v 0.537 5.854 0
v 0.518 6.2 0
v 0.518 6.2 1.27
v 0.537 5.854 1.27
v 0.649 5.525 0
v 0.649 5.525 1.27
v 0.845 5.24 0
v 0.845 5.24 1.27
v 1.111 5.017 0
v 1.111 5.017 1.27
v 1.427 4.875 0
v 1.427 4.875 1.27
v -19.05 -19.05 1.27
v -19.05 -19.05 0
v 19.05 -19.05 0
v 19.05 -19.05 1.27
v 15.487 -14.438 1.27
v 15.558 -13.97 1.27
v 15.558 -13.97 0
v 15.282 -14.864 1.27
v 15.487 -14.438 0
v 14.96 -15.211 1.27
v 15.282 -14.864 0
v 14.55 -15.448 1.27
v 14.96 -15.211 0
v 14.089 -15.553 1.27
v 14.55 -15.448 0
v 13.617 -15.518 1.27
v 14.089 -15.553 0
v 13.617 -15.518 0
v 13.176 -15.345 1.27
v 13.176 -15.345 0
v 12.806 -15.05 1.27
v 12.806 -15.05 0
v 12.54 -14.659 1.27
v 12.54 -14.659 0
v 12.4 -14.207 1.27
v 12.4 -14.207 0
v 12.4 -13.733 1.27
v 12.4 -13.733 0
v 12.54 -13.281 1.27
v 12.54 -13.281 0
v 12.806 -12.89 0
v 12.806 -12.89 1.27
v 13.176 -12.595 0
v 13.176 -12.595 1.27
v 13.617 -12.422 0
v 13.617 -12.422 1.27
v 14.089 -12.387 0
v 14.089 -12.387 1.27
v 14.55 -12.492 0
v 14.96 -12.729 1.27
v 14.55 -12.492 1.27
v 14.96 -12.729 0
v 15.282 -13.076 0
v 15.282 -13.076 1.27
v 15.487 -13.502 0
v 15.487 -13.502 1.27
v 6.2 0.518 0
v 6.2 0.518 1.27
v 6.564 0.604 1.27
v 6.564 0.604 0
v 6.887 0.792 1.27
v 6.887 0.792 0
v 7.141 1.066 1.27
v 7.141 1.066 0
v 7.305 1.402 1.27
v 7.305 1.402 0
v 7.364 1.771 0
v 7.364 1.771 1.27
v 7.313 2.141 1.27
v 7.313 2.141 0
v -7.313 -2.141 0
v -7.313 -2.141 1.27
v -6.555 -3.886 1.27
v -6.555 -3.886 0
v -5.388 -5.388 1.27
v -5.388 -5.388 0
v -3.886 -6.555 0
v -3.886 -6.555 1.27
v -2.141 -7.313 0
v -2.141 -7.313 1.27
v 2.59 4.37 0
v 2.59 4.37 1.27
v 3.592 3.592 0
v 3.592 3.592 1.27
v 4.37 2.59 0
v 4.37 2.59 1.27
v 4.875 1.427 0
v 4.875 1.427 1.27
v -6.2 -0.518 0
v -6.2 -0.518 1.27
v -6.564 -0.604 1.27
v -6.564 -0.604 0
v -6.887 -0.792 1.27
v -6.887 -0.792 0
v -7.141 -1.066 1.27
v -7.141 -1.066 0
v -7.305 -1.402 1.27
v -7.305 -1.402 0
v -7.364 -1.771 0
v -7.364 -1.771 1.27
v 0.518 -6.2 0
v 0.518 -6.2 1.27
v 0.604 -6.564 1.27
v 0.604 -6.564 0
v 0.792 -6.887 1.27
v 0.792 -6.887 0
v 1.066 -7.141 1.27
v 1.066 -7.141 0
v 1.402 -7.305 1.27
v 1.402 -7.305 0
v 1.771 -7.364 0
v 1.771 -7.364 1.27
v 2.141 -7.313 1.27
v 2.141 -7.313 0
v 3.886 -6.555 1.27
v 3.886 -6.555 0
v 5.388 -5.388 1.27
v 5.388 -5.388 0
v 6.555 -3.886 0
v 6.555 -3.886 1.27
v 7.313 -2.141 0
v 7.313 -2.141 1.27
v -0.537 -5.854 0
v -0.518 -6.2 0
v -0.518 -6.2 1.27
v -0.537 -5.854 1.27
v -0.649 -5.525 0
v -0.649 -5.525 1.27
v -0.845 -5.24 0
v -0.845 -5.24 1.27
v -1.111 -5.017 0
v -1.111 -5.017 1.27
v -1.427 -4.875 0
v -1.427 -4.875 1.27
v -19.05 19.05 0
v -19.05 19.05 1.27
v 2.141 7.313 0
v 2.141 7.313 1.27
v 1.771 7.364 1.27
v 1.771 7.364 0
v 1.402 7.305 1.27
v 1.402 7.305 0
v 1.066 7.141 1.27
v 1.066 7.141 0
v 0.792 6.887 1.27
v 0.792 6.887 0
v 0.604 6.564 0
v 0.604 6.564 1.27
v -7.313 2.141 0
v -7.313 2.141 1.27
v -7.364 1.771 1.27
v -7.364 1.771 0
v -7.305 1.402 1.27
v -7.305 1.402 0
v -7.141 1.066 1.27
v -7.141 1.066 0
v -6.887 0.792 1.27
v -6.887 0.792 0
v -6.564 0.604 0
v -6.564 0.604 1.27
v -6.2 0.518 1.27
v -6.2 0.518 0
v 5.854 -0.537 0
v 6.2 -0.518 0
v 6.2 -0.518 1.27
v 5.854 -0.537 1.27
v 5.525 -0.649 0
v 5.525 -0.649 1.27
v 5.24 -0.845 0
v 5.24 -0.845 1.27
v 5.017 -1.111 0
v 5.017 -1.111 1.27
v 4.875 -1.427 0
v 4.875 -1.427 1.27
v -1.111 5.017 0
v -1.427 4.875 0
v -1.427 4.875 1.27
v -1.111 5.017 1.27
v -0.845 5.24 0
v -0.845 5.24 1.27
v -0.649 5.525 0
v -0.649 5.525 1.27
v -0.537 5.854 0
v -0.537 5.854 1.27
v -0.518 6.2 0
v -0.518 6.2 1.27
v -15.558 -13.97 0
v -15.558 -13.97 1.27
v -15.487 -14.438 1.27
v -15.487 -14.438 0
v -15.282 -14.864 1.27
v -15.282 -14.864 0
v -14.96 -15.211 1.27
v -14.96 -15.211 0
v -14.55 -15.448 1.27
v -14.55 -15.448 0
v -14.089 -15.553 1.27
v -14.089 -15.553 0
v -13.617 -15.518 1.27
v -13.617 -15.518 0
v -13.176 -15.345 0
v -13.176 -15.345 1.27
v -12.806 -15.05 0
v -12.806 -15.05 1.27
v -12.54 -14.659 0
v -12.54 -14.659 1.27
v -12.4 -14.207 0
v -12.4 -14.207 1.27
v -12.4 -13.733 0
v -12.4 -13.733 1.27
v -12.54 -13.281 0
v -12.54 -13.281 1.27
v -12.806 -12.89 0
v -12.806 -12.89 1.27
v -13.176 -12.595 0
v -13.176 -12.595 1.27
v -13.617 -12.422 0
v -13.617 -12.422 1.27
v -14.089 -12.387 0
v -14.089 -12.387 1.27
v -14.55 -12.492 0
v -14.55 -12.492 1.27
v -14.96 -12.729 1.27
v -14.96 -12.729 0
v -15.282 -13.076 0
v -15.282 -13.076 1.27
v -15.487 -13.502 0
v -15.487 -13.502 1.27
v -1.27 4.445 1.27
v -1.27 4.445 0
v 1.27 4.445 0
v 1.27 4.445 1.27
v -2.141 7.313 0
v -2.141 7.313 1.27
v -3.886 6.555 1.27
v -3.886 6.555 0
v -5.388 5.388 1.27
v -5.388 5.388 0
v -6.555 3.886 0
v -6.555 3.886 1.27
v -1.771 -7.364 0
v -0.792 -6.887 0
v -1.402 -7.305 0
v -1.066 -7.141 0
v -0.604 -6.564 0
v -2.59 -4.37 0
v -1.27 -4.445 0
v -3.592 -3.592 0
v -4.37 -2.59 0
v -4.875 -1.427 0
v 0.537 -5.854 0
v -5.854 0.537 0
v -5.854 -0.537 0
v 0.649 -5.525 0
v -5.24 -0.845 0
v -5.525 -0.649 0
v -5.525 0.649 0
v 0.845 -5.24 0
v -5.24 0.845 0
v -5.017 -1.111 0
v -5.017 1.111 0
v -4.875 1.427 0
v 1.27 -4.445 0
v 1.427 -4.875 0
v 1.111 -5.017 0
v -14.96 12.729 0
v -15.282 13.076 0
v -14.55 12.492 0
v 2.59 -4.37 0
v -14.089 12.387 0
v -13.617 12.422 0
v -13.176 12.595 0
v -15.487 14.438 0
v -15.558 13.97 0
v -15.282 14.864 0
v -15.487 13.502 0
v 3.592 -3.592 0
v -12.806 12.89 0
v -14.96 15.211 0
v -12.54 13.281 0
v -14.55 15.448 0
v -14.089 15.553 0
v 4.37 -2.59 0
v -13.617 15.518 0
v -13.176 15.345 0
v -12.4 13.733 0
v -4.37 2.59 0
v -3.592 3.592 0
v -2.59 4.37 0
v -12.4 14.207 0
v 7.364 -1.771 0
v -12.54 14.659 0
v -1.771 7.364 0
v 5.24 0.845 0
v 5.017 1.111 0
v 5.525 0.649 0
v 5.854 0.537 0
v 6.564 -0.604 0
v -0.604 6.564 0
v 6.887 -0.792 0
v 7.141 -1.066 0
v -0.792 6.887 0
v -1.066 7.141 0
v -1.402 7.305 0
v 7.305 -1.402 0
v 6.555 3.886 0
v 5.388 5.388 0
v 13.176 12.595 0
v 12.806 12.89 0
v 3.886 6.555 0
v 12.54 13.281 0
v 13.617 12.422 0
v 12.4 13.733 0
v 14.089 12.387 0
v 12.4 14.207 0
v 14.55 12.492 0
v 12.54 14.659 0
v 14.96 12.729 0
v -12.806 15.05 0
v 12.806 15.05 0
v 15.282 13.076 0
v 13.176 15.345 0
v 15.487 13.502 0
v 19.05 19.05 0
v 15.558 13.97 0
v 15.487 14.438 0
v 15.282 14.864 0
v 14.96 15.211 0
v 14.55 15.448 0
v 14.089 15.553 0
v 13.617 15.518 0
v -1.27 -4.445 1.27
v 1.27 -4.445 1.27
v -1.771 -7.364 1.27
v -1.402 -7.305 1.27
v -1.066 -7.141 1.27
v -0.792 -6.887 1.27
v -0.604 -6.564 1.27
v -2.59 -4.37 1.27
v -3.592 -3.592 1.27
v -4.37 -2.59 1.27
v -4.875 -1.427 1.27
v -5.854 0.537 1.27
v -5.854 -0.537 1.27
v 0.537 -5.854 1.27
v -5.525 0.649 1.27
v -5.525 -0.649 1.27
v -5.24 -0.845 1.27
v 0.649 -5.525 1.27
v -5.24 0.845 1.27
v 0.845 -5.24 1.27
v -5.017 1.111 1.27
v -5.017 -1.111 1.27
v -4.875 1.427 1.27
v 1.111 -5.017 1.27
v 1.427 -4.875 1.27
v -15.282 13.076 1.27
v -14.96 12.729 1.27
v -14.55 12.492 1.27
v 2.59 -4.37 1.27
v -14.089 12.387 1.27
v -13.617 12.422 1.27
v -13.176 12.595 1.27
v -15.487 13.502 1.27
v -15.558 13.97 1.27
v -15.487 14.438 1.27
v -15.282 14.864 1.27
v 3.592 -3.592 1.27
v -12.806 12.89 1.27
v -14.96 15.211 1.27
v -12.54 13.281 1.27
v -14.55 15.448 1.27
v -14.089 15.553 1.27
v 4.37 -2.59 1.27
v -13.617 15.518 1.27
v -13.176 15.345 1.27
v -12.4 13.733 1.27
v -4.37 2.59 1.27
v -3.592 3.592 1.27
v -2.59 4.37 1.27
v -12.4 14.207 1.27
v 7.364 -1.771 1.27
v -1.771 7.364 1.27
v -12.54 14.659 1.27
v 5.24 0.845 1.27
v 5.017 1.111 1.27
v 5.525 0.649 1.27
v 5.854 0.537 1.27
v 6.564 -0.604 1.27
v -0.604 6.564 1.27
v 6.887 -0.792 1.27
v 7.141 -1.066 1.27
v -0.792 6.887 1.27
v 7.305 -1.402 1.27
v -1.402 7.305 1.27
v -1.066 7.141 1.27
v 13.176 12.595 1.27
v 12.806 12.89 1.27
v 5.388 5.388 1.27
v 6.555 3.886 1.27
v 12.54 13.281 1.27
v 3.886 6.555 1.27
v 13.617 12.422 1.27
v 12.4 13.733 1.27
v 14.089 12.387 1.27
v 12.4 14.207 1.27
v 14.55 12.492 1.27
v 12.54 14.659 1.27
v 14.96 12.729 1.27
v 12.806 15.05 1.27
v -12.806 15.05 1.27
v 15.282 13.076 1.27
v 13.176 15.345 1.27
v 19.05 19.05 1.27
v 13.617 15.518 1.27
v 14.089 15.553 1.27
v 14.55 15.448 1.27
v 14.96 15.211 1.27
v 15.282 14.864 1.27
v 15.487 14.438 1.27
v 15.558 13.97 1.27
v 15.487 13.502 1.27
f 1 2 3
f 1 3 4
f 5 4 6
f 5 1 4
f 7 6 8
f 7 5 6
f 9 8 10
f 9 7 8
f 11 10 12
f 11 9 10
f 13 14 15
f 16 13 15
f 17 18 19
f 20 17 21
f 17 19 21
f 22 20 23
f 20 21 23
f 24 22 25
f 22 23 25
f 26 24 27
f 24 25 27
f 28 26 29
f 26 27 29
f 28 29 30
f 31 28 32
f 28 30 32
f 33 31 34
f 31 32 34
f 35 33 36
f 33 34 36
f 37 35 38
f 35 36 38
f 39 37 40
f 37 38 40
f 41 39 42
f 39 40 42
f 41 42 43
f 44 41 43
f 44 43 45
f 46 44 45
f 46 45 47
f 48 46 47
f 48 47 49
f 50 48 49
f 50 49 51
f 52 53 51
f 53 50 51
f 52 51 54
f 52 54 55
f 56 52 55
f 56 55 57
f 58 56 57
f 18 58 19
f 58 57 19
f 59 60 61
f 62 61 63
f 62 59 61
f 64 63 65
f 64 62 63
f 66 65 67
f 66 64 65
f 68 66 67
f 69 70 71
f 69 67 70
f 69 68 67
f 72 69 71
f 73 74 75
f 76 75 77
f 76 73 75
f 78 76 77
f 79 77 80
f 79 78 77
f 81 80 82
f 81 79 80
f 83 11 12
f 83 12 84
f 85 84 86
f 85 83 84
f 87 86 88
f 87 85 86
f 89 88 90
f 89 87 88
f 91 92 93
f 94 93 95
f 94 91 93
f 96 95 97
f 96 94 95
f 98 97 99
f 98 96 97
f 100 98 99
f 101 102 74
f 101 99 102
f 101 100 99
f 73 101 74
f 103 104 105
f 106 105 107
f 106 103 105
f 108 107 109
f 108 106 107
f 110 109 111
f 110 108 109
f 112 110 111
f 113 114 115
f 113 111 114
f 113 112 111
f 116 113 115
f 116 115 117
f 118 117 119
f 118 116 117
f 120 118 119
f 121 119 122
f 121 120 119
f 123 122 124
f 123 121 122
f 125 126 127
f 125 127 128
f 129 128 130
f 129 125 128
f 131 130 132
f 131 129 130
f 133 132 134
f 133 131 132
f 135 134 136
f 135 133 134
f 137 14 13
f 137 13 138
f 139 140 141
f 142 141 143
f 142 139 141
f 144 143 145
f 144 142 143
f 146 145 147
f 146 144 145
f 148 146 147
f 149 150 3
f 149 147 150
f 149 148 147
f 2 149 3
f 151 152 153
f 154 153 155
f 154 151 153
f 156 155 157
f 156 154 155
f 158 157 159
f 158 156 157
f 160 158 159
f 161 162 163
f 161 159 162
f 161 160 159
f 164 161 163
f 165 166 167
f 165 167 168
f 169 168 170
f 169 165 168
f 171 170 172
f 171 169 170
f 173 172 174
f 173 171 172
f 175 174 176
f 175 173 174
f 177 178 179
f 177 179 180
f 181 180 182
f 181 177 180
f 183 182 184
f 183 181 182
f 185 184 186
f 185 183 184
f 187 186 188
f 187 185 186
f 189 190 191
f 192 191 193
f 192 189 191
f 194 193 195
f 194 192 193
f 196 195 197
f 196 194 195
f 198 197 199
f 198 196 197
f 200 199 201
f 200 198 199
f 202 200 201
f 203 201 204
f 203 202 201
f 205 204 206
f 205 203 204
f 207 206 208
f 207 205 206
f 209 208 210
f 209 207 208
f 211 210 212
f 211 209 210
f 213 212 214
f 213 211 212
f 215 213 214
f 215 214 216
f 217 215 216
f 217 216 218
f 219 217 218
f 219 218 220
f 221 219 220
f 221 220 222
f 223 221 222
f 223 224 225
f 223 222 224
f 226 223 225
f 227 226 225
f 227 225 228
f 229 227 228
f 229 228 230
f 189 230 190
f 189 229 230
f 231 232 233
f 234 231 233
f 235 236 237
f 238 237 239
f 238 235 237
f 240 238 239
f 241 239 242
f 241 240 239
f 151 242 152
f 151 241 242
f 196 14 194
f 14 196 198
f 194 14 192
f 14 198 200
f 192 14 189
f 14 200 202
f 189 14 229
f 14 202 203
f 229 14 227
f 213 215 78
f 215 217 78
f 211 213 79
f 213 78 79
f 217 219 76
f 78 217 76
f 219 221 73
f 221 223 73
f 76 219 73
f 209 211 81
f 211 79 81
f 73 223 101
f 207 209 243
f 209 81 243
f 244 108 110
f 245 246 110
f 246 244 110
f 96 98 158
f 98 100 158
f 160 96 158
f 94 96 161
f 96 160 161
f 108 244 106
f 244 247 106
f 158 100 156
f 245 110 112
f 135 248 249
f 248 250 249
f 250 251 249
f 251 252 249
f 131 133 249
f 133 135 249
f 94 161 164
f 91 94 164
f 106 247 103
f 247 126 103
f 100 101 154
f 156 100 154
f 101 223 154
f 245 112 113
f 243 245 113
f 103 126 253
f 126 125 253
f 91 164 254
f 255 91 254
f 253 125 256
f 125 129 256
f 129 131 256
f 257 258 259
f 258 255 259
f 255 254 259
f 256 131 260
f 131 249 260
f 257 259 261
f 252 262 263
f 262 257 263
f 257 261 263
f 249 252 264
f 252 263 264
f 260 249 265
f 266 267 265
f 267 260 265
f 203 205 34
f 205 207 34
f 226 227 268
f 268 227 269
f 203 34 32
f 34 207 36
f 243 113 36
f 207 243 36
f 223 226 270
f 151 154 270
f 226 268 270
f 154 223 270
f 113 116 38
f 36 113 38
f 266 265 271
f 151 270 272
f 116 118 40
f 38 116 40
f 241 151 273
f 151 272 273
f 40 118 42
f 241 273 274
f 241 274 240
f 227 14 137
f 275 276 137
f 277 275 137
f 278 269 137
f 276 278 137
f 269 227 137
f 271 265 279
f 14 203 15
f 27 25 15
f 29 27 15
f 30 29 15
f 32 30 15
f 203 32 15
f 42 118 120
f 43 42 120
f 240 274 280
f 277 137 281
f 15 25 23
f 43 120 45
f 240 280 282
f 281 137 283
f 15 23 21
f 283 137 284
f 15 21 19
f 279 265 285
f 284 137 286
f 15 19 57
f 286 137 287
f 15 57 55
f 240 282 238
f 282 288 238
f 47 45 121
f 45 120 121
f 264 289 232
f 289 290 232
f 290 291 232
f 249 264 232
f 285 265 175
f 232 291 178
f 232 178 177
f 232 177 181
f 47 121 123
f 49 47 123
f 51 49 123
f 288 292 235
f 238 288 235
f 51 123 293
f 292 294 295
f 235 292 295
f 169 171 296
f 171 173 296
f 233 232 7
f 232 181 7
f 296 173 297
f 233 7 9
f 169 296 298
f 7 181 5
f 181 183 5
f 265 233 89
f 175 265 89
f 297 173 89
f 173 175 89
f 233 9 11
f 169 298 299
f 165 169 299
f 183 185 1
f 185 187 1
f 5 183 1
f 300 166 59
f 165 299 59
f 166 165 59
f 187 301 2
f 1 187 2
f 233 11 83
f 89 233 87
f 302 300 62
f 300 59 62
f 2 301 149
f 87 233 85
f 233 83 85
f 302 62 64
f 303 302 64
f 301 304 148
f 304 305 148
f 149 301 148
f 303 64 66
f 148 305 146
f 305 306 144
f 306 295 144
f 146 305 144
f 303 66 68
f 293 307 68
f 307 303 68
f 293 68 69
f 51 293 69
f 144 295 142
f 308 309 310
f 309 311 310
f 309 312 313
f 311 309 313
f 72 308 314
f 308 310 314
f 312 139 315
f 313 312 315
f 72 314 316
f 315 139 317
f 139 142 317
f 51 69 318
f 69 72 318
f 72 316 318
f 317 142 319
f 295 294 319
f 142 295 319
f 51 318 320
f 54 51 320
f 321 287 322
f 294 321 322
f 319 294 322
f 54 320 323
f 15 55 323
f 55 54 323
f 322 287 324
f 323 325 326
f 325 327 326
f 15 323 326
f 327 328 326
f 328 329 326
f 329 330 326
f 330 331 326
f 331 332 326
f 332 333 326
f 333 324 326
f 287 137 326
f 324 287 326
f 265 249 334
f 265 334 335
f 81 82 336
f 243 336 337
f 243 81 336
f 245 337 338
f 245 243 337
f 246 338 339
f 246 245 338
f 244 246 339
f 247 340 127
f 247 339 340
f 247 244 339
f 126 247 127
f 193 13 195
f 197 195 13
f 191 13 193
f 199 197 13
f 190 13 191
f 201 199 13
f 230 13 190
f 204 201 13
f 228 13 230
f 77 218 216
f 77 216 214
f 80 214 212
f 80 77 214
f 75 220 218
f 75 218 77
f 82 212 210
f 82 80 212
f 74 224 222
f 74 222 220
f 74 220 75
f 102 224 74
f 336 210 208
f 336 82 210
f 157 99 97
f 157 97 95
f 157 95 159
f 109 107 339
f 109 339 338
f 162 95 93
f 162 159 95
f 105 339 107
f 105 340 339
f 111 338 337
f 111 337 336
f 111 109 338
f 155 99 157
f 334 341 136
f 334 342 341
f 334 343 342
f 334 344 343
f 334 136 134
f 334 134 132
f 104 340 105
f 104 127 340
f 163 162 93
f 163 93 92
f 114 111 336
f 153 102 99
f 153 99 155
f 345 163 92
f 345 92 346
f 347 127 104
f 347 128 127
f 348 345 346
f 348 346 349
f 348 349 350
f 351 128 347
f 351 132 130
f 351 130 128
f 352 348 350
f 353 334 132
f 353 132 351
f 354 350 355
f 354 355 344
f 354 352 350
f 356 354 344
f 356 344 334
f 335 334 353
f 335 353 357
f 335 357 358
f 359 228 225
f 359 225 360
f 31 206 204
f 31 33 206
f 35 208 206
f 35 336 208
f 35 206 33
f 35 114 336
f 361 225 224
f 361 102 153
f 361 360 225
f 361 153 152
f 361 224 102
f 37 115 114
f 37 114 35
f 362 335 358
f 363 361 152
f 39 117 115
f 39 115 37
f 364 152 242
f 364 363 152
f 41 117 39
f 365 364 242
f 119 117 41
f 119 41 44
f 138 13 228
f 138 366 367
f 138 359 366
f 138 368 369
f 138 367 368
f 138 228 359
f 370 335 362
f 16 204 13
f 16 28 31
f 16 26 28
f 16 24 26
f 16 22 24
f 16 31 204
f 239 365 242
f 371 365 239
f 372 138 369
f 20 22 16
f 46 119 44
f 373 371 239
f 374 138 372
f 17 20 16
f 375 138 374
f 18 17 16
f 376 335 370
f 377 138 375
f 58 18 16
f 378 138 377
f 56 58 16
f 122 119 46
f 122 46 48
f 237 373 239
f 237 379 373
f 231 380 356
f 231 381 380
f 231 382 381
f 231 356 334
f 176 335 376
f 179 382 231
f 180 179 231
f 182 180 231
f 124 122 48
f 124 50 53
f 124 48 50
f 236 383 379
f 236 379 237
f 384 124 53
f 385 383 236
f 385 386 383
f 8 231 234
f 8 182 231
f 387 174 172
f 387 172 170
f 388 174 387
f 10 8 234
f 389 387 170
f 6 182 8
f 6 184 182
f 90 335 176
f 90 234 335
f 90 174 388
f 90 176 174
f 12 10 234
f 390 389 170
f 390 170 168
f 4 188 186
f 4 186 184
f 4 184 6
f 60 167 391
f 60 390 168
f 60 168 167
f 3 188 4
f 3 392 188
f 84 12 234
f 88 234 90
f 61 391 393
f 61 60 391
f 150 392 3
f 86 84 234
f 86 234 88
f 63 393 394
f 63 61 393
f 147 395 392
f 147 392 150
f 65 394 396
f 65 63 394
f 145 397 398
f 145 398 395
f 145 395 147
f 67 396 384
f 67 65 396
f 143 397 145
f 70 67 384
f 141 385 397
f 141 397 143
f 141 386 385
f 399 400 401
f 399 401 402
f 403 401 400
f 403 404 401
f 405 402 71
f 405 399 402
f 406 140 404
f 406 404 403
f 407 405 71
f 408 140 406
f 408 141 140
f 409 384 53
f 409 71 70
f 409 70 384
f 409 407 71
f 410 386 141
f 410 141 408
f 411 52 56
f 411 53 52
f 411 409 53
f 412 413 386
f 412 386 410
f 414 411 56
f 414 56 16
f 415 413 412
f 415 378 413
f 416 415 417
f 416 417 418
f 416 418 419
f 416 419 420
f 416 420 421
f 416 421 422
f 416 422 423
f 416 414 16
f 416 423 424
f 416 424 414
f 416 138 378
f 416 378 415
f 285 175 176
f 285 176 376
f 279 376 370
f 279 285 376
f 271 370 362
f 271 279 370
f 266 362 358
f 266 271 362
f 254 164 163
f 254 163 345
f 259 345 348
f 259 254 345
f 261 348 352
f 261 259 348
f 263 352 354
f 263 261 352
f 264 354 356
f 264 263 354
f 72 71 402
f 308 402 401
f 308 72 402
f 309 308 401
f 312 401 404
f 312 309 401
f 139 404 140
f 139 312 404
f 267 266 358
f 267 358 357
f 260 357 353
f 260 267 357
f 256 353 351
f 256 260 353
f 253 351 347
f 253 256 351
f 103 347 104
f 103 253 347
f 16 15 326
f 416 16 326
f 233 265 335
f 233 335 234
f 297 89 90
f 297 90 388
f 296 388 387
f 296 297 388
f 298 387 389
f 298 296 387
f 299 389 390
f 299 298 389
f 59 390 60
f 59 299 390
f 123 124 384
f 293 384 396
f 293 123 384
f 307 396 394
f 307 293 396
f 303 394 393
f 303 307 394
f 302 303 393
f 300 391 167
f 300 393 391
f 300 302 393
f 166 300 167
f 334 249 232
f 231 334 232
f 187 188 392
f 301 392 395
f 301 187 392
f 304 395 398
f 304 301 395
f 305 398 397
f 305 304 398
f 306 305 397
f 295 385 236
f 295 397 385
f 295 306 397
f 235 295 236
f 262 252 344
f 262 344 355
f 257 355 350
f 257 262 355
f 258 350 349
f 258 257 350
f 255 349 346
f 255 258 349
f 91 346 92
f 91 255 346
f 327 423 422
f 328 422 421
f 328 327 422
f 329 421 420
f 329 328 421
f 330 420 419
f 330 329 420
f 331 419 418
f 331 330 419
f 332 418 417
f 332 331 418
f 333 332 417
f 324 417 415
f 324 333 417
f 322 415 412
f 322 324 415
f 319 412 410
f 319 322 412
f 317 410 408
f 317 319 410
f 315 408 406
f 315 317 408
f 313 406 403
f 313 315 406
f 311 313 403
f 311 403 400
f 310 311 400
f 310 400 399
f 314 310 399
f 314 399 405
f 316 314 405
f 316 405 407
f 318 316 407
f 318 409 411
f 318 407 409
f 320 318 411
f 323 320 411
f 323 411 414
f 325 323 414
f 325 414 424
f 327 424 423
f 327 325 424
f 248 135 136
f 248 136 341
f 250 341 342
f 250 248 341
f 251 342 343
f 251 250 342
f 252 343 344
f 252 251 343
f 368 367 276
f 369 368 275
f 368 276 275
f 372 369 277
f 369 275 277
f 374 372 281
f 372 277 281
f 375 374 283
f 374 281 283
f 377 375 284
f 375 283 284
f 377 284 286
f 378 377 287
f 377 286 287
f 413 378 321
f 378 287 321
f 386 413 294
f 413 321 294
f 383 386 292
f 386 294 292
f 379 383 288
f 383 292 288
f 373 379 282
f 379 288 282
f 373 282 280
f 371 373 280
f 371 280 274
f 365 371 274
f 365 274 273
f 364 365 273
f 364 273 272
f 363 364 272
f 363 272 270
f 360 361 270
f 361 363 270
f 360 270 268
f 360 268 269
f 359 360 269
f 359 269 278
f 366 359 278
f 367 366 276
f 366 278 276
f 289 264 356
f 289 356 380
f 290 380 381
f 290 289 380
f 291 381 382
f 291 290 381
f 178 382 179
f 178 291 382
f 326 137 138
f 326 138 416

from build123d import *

# Parameters (mm, degrees)
F0_W     = 38.1
F0_H     = 38.1
F1_DEPTH = 1.27
F2_R     = 1.5875
F3_DEPTH = 25.4
F6_W     = 2.54
F6_H     = 8.89
F7_DEPTH = 25.4


with BuildPart() as f1:
    # F0 (on Top) → F1 (new body)
    with BuildSketch(Plane.XY):
        Rectangle(F0_W, F0_H)
    extrude(amount=F1_DEPTH)

    # F2 (on Top) → F3 (cut)
    with BuildSketch(Plane.XY):
        with Locations((13.97, 13.97)):
            Circle(F2_R)
    extrude(amount=F3_DEPTH, mode=Mode.SUBTRACT)

    # F4: F1 across plane


with BuildPart() as f1_1:
    add(f1.part)
    add(f1.part.mirror(Plane.YZ), mode=Mode.INTERSECT)

    # F5: F1 across plane


with BuildPart() as f1_2:
    add(f1_1.part)
    add(f1_1.part.mirror(Plane.XZ), mode=Mode.INTERSECT)

    # F6 (on Top) → F7 (cut)
    with BuildSketch(Plane.XY):
        with BuildLine():
            ThreePointArc((-6.200063, -0.518475), (-7.141481, -1.065611), (-7.313076, -2.14087))
            ThreePointArc((-7.313076, -2.14087), (-5.388154, -5.388154), (-2.14087, -7.313076))
            ThreePointArc((-2.14087, -7.313076), (-1.065611, -7.141481), (-0.518475, -6.200063))
            ThreePointArc((-0.518475, -6.200063), (-0.736807, -5.375783), (-1.427246, -4.875384))
            ThreePointArc((-1.427246, -4.875384), (-3.592102, -3.592102), (-4.875384, -1.427246))
            ThreePointArc((-4.875384, -1.427246), (-5.375783, -0.736807), (-6.200063, -0.518475))
        make_face()
        with BuildLine():
            ThreePointArc((0.518475, -6.200063), (1.065611, -7.141481), (2.14087, -7.313076))
            ThreePointArc((2.14087, -7.313076), (5.388154, -5.388154), (7.313076, -2.14087))
            ThreePointArc((7.313076, -2.14087), (7.141481, -1.065611), (6.200063, -0.518475))
            ThreePointArc((6.200063, -0.518475), (5.375783, -0.736807), (4.875384, -1.427246))
            ThreePointArc((4.875384, -1.427246), (3.592102, -3.592102), (1.427246, -4.875384))
            ThreePointArc((1.427246, -4.875384), (0.736807, -5.375783), (0.518475, -6.200063))
        make_face()
        with BuildLine():
            ThreePointArc((6.200063, 0.518475), (7.141481, 1.065611), (7.313076, 2.14087))
            ThreePointArc((7.313076, 2.14087), (5.388154, 5.388154), (2.14087, 7.313076))
            ThreePointArc((2.14087, 7.313076), (1.065611, 7.141481), (0.518475, 6.200063))
            ThreePointArc((0.518475, 6.200063), (0.736807, 5.375783), (1.427246, 4.875384))
            ThreePointArc((1.427246, 4.875384), (3.592102, 3.592102), (4.875384, 1.427246))
            ThreePointArc((4.875384, 1.427246), (5.375783, 0.736807), (6.200063, 0.518475))
        make_face()
        with BuildLine():
            ThreePointArc((-0.518475, 6.200063), (-1.065611, 7.141481), (-2.14087, 7.313076))
            ThreePointArc((-2.14087, 7.313076), (-5.388154, 5.388154), (-7.313076, 2.14087))
            ThreePointArc((-7.313076, 2.14087), (-7.141481, 1.065611), (-6.200063, 0.518475))
            ThreePointArc((-6.200063, 0.518475), (-5.375783, 0.736807), (-4.875384, 1.427246))
            ThreePointArc((-4.875384, 1.427246), (-3.592102, 3.592102), (-1.427246, 4.875384))
            ThreePointArc((-1.427246, 4.875384), (-0.736807, 5.375783), (-0.518475, 6.200063))
        make_face()
        Rectangle(F6_W, F6_H)
    extrude(amount=F7_DEPTH, mode=Mode.SUBTRACT)


solid = f1_2.part
